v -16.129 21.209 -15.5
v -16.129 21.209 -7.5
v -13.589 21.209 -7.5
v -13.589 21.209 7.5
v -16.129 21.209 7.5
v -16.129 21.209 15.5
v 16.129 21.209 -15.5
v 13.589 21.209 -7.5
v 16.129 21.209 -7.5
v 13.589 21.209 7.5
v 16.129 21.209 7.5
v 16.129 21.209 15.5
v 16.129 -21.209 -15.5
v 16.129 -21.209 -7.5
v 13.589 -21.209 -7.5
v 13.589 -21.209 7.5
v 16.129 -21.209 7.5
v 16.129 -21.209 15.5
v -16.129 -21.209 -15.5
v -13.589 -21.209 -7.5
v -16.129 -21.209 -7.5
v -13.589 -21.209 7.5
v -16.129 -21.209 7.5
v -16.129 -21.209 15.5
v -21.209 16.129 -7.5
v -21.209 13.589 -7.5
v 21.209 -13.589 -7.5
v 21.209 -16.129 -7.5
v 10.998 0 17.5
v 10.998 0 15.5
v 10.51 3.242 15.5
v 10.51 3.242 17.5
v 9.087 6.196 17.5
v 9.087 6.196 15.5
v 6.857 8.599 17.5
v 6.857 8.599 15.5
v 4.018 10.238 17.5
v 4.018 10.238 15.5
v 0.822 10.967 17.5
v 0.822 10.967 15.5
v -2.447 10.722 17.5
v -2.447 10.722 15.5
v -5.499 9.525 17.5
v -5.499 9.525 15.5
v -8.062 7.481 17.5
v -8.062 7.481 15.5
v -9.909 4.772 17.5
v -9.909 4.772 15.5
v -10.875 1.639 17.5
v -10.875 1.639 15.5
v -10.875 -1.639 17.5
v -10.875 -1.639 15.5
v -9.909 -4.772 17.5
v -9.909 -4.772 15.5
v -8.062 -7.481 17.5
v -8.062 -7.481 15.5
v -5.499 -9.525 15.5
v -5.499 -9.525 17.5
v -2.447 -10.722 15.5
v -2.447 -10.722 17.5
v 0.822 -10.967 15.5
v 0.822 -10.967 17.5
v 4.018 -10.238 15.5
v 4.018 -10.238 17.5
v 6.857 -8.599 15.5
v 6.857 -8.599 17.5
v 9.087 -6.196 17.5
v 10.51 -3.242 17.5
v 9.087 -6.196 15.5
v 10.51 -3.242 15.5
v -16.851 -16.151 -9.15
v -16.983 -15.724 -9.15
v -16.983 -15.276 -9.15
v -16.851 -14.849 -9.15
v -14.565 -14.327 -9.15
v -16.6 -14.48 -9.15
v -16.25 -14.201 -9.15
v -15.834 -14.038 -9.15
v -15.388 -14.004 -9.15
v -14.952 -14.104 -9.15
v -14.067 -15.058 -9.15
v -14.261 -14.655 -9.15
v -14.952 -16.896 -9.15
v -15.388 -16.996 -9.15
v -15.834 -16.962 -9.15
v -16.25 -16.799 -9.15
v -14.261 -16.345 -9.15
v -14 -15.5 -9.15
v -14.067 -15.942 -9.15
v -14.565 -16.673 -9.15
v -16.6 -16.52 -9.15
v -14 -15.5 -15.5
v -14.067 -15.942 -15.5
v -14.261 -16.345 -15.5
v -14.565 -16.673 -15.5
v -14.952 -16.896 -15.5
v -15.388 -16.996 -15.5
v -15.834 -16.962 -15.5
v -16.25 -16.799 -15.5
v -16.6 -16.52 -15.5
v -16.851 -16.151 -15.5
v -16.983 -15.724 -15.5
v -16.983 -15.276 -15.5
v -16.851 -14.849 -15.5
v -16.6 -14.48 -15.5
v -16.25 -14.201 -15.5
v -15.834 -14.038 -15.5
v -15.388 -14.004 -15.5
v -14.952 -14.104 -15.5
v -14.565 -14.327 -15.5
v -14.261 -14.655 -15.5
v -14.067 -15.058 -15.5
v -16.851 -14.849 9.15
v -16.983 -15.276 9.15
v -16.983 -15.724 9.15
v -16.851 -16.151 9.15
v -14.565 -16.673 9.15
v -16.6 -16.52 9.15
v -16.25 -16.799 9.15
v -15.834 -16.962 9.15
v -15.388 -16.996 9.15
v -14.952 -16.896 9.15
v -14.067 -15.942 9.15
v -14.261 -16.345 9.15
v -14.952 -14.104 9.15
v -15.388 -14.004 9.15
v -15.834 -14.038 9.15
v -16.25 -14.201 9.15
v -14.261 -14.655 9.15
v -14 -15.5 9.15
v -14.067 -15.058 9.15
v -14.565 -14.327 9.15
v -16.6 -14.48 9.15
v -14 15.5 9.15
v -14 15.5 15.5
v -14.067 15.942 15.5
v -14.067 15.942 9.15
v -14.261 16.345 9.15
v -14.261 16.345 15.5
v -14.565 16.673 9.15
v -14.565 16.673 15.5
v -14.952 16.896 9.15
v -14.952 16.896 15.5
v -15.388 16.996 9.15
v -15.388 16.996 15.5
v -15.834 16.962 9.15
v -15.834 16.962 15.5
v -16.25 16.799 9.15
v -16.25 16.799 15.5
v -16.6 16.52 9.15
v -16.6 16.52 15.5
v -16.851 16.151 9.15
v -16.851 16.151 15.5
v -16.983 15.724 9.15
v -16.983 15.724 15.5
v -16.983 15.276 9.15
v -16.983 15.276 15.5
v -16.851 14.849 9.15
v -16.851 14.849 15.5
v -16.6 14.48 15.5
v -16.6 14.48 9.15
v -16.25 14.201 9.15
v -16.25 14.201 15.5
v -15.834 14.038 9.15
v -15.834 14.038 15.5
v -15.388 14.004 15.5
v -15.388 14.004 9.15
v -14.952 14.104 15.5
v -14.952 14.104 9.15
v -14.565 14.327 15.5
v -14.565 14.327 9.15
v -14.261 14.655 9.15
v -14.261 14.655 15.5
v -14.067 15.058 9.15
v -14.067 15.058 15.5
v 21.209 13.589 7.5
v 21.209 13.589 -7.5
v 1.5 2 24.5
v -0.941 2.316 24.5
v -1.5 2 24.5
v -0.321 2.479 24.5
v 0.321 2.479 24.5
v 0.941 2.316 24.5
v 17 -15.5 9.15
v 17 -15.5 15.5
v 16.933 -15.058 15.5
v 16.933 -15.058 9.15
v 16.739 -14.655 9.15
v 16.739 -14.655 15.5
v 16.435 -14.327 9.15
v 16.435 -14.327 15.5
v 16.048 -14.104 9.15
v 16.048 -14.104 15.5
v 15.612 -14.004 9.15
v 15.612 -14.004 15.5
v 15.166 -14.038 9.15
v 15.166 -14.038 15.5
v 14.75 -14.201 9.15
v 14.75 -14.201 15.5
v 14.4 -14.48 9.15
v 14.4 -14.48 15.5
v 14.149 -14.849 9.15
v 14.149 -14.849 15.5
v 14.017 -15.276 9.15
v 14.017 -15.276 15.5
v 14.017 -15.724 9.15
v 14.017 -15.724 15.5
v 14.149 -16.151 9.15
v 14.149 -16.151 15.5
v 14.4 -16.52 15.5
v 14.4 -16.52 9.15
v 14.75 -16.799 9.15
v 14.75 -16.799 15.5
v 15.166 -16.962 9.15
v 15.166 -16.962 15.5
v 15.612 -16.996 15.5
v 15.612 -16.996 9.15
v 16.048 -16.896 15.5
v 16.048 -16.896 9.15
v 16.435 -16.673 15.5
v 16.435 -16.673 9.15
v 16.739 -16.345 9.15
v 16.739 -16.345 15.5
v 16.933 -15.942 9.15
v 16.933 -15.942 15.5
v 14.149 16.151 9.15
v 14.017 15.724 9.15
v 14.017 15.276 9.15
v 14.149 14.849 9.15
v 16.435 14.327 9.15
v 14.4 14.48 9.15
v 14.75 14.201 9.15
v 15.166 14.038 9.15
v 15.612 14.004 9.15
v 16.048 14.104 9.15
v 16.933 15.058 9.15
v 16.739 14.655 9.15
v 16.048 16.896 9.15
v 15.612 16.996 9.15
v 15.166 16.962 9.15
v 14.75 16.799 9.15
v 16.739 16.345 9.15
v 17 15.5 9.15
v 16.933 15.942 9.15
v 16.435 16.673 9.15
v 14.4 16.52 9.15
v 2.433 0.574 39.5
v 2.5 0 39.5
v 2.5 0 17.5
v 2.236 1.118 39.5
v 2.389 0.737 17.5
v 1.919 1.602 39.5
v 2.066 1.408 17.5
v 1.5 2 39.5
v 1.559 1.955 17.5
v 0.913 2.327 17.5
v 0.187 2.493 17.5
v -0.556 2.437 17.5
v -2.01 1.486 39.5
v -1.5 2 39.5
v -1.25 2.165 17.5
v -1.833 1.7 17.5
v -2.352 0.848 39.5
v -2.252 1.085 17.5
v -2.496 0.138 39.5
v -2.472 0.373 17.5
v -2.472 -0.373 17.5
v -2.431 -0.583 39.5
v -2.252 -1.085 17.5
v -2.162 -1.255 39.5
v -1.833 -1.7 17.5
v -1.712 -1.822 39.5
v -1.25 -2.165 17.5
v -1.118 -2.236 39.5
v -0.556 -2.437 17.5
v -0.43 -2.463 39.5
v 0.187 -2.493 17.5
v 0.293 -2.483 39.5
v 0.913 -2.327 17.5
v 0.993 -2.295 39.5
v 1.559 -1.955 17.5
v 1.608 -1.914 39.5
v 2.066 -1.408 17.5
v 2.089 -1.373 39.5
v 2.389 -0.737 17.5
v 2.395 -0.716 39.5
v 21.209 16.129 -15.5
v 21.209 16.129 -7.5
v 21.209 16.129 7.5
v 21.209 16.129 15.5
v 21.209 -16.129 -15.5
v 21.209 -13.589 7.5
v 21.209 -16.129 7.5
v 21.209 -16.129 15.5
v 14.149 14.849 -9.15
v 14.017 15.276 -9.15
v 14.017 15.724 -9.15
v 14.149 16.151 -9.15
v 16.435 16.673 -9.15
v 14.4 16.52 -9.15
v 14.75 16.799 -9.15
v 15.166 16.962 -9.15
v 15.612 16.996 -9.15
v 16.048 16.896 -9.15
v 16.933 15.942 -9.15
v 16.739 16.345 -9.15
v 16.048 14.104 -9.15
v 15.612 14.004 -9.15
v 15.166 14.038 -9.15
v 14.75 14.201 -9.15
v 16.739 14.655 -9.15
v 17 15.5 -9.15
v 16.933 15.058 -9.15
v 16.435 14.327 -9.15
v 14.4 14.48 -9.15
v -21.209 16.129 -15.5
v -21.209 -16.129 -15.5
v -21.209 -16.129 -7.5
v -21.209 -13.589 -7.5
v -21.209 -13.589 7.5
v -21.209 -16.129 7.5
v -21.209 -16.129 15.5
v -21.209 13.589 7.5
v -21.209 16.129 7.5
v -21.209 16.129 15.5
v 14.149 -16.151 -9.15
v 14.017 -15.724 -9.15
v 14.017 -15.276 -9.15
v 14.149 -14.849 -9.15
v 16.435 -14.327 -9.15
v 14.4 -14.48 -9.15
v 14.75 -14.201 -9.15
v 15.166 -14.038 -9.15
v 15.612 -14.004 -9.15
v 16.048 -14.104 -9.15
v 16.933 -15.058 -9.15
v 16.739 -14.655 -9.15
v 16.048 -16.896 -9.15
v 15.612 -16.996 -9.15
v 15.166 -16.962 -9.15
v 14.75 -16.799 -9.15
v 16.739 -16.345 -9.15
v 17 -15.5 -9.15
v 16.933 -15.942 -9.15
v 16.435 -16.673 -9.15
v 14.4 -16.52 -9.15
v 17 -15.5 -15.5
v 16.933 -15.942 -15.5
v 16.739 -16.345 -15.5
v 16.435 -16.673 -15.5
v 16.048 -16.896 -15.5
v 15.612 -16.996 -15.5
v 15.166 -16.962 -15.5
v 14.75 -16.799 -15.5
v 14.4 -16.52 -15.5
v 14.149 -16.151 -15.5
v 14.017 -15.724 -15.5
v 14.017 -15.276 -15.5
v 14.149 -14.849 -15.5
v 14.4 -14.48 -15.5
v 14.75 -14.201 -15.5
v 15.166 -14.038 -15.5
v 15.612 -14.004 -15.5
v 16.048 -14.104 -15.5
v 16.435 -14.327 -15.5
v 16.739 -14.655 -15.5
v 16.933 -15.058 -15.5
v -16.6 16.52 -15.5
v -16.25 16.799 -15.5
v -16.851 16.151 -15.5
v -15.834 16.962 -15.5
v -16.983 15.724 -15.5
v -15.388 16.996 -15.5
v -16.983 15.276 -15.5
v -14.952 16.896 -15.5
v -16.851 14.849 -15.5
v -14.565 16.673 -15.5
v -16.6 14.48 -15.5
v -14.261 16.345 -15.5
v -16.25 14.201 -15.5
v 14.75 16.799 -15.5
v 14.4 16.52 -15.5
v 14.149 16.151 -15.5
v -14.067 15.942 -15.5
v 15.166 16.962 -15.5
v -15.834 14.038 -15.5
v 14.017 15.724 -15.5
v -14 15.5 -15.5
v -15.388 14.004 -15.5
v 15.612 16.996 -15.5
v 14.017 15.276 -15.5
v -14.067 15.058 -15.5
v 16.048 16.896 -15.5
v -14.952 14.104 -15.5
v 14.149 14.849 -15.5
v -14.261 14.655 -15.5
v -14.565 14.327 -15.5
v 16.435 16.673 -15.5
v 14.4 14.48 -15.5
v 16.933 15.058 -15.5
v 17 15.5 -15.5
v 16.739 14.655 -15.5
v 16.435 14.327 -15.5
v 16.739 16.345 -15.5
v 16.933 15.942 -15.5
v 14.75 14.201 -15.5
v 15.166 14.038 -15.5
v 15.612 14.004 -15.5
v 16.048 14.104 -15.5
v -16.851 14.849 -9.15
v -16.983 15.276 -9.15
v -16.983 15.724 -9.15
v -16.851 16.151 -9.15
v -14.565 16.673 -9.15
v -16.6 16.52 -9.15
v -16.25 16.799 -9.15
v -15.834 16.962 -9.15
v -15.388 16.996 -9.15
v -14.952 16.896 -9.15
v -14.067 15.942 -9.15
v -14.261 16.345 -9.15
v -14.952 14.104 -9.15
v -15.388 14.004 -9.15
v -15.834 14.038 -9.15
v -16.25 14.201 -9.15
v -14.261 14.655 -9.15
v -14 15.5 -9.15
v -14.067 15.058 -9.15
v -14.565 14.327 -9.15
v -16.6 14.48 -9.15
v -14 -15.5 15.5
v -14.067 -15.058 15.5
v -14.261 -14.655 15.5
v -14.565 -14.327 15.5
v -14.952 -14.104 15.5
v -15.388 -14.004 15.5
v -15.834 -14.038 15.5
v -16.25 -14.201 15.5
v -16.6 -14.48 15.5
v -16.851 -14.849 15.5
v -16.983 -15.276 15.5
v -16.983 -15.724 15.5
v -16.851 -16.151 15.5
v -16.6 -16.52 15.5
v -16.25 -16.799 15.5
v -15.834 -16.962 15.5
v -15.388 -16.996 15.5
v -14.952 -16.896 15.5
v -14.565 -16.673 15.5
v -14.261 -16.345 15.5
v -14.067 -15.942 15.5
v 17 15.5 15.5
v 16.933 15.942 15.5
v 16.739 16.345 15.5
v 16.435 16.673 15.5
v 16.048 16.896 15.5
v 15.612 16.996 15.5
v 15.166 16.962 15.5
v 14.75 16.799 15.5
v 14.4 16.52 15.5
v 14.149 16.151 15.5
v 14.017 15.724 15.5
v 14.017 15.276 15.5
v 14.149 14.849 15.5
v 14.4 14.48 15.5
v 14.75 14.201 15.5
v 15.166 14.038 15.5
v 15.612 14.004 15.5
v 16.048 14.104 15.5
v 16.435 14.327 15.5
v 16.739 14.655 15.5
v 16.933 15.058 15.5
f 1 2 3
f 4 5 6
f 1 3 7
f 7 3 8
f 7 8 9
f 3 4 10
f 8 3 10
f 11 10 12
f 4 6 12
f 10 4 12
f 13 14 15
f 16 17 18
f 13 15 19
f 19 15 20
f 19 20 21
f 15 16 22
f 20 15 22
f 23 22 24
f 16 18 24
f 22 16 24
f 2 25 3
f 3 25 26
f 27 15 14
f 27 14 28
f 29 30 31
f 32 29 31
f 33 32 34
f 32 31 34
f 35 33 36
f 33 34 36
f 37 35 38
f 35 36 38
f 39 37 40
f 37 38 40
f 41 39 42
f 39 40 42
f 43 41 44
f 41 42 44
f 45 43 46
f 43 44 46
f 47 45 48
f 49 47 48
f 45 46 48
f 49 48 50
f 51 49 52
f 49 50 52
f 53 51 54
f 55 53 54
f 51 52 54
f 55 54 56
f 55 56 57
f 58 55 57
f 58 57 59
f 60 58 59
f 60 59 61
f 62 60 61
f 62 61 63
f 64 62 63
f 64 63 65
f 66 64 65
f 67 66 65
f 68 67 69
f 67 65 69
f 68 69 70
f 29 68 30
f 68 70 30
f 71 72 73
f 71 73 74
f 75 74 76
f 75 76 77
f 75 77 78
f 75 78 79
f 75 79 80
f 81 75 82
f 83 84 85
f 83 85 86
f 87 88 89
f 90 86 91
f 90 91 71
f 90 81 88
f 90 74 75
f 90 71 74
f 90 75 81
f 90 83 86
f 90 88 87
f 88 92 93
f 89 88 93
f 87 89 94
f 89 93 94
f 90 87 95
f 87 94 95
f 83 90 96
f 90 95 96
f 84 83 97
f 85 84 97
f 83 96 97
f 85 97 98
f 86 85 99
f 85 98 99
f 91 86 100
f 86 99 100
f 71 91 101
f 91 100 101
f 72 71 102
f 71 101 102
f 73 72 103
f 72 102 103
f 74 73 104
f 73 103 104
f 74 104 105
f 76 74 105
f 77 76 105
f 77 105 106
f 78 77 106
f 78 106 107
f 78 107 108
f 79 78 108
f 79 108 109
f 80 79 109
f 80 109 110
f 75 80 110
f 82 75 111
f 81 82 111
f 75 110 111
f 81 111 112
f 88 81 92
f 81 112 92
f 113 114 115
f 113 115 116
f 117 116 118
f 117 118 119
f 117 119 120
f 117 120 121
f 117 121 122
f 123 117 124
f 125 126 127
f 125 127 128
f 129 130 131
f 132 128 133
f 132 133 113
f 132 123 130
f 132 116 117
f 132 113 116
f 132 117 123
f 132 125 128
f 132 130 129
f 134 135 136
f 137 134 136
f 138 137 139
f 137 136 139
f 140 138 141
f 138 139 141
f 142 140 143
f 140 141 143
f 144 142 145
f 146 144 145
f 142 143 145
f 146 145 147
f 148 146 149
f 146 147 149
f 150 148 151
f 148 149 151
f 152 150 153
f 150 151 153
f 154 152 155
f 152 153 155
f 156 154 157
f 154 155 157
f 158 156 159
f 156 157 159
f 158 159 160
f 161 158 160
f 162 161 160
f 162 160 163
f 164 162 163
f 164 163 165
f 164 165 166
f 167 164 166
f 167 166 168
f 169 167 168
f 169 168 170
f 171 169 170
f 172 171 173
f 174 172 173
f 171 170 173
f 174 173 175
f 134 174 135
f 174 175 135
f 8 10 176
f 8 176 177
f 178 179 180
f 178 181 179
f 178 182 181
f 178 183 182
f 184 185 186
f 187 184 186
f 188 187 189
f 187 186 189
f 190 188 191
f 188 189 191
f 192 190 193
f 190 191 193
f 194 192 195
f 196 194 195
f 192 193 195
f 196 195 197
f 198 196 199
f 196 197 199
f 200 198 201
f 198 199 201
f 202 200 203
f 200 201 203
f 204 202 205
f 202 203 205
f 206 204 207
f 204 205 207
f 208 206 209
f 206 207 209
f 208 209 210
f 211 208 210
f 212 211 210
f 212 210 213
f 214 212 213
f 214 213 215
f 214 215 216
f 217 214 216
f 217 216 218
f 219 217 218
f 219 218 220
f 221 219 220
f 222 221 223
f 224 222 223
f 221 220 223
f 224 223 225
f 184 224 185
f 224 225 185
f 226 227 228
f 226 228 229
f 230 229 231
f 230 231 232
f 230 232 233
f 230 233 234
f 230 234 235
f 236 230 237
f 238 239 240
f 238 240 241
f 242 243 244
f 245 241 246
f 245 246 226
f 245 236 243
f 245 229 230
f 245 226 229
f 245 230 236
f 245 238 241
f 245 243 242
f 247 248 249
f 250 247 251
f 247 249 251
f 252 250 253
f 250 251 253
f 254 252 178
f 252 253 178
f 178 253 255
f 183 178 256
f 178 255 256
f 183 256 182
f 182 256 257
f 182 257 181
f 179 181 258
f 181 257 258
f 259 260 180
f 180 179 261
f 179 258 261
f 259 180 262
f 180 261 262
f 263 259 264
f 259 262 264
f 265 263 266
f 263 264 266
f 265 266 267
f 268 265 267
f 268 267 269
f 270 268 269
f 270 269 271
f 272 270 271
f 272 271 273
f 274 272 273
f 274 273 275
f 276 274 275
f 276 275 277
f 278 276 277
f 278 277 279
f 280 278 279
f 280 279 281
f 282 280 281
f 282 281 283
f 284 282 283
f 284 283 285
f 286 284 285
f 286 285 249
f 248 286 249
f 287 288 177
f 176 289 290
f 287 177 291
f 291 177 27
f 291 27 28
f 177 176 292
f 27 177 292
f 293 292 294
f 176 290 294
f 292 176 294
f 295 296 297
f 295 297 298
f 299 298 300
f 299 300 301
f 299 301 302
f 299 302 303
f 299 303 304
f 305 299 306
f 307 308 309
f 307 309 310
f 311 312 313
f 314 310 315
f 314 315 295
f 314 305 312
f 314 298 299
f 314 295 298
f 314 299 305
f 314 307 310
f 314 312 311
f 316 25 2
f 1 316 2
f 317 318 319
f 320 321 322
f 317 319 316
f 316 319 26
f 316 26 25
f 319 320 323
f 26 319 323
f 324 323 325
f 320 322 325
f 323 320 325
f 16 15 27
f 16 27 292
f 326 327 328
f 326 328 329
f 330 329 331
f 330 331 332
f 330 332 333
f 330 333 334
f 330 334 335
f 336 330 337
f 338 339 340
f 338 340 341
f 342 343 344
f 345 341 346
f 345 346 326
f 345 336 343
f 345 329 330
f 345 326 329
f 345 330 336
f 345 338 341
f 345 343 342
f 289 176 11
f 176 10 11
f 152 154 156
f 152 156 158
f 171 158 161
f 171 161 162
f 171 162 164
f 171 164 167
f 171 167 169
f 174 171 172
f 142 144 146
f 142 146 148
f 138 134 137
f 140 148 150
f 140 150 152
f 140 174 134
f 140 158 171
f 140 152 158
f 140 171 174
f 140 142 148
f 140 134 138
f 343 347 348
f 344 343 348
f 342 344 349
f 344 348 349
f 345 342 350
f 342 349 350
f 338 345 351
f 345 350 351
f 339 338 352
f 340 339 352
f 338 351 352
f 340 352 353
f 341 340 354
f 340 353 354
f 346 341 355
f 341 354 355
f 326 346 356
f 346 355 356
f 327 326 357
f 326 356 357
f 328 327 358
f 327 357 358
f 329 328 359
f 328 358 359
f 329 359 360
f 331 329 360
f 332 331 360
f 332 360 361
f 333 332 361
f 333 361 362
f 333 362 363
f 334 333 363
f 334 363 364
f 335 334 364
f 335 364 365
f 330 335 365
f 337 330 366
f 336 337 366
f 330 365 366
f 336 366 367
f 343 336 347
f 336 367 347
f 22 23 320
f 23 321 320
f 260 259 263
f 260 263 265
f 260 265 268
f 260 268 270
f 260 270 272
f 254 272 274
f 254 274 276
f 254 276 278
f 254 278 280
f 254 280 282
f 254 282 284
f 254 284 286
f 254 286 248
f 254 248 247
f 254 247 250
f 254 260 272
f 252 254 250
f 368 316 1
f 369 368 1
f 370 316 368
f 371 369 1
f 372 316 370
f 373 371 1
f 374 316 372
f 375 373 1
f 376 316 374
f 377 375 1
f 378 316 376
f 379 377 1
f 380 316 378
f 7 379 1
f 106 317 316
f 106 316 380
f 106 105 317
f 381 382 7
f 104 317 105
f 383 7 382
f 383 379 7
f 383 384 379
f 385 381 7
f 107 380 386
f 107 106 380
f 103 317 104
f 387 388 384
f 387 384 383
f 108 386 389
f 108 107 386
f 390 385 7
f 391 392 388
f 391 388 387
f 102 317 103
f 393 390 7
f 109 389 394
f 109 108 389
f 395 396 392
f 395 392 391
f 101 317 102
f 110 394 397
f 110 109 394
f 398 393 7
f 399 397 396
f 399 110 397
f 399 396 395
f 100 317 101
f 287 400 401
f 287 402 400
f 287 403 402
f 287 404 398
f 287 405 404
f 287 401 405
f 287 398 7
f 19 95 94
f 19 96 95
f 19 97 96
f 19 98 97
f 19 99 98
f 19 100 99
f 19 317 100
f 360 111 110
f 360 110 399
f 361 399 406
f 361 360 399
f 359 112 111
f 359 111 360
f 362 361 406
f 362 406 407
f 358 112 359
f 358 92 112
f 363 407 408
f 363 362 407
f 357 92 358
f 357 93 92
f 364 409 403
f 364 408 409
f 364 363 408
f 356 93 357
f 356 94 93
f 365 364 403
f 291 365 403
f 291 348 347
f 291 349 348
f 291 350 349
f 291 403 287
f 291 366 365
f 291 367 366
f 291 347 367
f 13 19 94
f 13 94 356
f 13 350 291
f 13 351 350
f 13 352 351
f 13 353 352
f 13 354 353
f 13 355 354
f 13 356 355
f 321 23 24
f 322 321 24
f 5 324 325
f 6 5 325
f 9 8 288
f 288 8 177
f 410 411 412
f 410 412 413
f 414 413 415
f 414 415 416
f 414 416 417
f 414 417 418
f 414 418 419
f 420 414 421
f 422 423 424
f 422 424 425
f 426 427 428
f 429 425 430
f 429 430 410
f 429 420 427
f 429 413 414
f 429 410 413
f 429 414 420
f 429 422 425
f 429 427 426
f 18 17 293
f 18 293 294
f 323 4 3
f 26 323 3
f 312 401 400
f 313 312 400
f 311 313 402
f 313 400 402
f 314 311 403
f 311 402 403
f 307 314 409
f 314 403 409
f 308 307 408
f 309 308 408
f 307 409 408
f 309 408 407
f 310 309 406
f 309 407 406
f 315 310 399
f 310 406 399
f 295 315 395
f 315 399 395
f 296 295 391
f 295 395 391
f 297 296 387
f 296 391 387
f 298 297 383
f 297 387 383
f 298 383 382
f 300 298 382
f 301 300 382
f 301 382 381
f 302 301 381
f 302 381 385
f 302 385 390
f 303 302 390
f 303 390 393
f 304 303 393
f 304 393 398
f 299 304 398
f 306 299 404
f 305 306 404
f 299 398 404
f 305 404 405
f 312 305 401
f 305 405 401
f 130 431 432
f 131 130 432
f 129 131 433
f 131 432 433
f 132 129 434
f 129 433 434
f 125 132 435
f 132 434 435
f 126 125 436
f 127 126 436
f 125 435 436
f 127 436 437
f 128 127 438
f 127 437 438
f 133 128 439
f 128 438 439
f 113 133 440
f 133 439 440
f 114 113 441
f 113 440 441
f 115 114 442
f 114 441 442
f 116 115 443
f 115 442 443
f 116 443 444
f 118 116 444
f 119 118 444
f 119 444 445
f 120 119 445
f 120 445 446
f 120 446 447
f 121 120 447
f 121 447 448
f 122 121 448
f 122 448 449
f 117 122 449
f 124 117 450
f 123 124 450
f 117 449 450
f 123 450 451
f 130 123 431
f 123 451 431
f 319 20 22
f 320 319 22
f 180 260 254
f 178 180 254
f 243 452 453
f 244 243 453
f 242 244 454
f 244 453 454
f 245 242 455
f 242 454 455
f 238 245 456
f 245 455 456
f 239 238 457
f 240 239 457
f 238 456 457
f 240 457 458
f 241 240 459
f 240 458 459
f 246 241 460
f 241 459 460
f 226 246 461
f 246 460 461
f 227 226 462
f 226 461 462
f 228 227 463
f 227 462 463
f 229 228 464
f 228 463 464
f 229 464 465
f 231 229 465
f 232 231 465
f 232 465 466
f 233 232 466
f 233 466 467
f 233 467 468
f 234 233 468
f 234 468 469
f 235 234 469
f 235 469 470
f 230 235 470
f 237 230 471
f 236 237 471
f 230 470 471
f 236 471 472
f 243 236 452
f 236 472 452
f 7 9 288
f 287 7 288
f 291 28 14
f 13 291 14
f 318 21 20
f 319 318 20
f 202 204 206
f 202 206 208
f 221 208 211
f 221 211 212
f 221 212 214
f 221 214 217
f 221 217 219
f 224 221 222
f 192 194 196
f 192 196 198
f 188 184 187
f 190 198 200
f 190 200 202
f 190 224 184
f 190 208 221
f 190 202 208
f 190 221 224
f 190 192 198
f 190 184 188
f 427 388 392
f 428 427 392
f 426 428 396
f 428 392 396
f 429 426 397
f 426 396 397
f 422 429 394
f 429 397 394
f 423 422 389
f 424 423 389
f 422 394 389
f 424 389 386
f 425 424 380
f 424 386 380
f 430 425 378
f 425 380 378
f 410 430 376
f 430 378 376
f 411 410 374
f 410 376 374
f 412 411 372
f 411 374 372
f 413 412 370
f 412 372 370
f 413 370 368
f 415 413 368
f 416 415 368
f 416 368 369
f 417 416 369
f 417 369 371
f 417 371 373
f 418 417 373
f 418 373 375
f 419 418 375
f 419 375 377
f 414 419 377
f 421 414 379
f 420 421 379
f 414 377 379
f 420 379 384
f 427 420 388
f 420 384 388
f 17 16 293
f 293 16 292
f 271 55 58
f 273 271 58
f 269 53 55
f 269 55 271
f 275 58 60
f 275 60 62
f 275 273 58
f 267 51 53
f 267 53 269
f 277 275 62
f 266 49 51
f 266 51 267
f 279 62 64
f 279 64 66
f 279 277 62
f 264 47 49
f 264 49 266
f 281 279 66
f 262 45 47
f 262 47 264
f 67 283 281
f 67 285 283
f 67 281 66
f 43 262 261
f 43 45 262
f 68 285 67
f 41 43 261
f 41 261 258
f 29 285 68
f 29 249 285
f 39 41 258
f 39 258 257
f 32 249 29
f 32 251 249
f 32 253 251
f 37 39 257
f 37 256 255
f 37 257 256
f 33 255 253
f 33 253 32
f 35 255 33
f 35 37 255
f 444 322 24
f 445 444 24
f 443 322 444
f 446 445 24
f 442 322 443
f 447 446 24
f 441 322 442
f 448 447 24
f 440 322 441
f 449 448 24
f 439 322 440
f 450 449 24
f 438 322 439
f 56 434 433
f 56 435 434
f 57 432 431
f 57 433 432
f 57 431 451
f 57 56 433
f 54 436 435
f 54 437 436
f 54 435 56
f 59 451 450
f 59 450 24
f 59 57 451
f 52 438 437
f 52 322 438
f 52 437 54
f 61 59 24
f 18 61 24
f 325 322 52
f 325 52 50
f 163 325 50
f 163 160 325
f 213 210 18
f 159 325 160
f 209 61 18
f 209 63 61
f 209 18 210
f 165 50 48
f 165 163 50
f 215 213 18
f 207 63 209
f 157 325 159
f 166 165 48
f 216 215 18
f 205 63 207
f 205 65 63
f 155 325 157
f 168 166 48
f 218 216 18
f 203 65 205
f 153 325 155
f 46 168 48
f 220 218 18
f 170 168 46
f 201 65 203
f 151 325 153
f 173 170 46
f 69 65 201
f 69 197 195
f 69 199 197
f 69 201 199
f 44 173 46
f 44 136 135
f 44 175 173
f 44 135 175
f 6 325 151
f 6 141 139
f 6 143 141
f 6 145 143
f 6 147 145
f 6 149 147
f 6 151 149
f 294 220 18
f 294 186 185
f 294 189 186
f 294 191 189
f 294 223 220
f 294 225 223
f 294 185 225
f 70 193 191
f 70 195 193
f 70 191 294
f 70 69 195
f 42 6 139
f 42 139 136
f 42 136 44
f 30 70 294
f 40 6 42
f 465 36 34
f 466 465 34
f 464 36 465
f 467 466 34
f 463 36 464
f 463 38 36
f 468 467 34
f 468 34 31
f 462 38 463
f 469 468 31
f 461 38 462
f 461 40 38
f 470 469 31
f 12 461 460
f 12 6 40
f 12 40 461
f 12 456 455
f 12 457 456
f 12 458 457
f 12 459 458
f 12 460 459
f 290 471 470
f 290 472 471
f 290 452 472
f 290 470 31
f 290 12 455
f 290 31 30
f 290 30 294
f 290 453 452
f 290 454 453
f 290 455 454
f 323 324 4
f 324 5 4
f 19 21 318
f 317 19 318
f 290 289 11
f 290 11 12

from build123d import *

# Parameters (mm, degrees)
F0_W      = 42.418
F0_H      = 42.418
F4_DEPTH  = 7.5
F5_SIZE   = 7.62
F7_DEPTH  = 8
F8_SIZE   = 5.08
F10_DEPTH = 8
F11_R     = 10.9982
F12_DEPTH = 2
F13_R     = 2.5
F14_DEPTH = 22
F16_DEPTH = 15
F17_R     = 1.5
F18_DEPTH = 6.35
F21_R     = 1.5
F22_DEPTH = 6.35


with BuildPart() as f4:
    # F0 (on Top) → F4 (new body, symmetric)
    with BuildSketch(Plane.XY):
        Rectangle(F0_W, F0_H)
    extrude(amount=F4_DEPTH, both=True)

    # F5
    f5_edges = [f4.edges().sort_by_distance(p)[0] for p in [
        (21.209, 21.209, 0),
        (-21.209, 21.209, 0),
        (-21.209, -21.209, 0),
        (21.209, -21.209, 0),
    ]]
    chamfer(f5_edges, length=F5_SIZE)

    # F6 (on face) → F7 (join)
    with BuildSketch(Plane.XY.offset(7.5)):
        Polygon((13.589, 21.209), (-13.589, 21.209), (-21.209, 13.589), (-21.209, -13.589), (-13.589, -21.209), (13.589, -21.209), (21.209, -13.589), (21.209, 13.589), align=None)
        Polygon((21.209, 21.209), (13.589, 21.209), (21.209, 13.589), align=None)
        Polygon((-13.589, 21.209), (-21.209, 21.209), (-21.209, 13.589), align=None)
        Polygon((-13.589, -21.209), (-21.209, -13.589), (-21.209, -21.209), align=None)
        Polygon((21.209, -21.209), (21.209, -13.589), (13.589, -21.209), align=None)
    extrude(amount=F7_DEPTH)

    # F8
    f8_edges = [f4.edges().sort_by_distance(p)[0] for p in [
        (21.209, 21.209, 11.5),
        (-21.209, 21.209, 11.5),
        (-21.209, -21.209, 11.5),
        (21.209, -21.209, 11.5),
    ]]
    chamfer(f8_edges, length=F8_SIZE)

    # F9 (on face) → F10 (join)
    with BuildSketch(Plane(origin=(0, 0, -7.5), x_dir=(1, 0, 0), z_dir=(0, 0, -1))):
        Polygon((-13.589, 21.209), (-16.129, 21.209), (-21.209, 16.129), (-21.209, 13.589), align=None)
        Polygon((16.129, 21.209), (13.589, 21.209), (21.209, 13.589), (21.209, 16.129), align=None)
        Polygon((21.209, -16.129), (21.209, -13.589), (13.589, -21.209), (16.129, -21.209), align=None)
        Polygon((-13.589, -21.209), (-21.209, -13.589), (-21.209, -16.129), (-16.129, -21.209), align=None)
        Polygon((13.589, 21.209), (-13.589, 21.209), (-21.209, 13.589), (-21.209, -13.589), (-13.589, -21.209), (13.589, -21.209), (21.209, -13.589), (21.209, 13.589), align=None)
    extrude(amount=F10_DEPTH)

    # F11 (on face) → F12 (join)
    with BuildSketch(Plane.XY.offset(15.5)):
        Circle(F11_R)
    extrude(amount=F12_DEPTH)

    # F13 (on face) → F14 (join)
    with BuildSketch(Plane.XY.offset(17.5)):
        Circle(F13_R)
    extrude(amount=F14_DEPTH)

    # F15 (on face) → F16 (cut)
    with BuildSketch(Plane.XY.offset(39.5)):
        with BuildLine():
            Line((2.6203631624, 2.9334036984), (-2.6333660554, 2.9334036984))
            Line((-2.6333660554, 2.9334036984), (-2.6333660554, 2))
            Line((-2.6333660554, 2), (-1.5, 2))
            ThreePointArc((-1.5, 2), (0, 2.5), (1.5, 2))
            Line((1.5, 2), (2.6203631624, 2))
            Line((2.6203631624, 2), (2.6203631624, 2.9334036984))
        make_face()
        with BuildLine():
            ThreePointArc((1.5, 2), (0, 2.5), (-1.5, 2))
            Line((-1.5, 2), (1.5, 2))
        make_face()
    extrude(amount=-F16_DEPTH, mode=Mode.SUBTRACT)

    # F17 (on face) → F18 (cut)
    with BuildSketch(Plane.XY.offset(15.5)):
        with Locations((-15.5, 15.5)):
            Circle(F17_R)
        with Locations((15.5, 15.5)):
            Circle(F17_R)
        with Locations((15.5, -15.5)):
            Circle(F17_R)
        with Locations((-15.5, -15.5)):
            Circle(F17_R)
    extrude(amount=-F18_DEPTH, mode=Mode.SUBTRACT)


with BuildPart() as f19_1:
    # F19: copy of F4
    add(f4.part)


with BuildPart() as f4_1:
    add(f4.part)

    # F21 (on face) → F22 (cut)
    with BuildSketch(Plane(origin=(0, 0, -15.5), x_dir=(1, 0, 0), z_dir=(0, 0, -1))):
        with Locations((-15.5, 15.5)):
            Circle(F21_R)
        with Locations((15.5, 15.5)):
            Circle(F21_R)
        with Locations((15.5, -15.5)):
            Circle(F21_R)
        with Locations((-15.5, -15.5)):
            Circle(F21_R)
    extrude(amount=-F22_DEPTH, mode=Mode.SUBTRACT)


solid = f4_1.part
